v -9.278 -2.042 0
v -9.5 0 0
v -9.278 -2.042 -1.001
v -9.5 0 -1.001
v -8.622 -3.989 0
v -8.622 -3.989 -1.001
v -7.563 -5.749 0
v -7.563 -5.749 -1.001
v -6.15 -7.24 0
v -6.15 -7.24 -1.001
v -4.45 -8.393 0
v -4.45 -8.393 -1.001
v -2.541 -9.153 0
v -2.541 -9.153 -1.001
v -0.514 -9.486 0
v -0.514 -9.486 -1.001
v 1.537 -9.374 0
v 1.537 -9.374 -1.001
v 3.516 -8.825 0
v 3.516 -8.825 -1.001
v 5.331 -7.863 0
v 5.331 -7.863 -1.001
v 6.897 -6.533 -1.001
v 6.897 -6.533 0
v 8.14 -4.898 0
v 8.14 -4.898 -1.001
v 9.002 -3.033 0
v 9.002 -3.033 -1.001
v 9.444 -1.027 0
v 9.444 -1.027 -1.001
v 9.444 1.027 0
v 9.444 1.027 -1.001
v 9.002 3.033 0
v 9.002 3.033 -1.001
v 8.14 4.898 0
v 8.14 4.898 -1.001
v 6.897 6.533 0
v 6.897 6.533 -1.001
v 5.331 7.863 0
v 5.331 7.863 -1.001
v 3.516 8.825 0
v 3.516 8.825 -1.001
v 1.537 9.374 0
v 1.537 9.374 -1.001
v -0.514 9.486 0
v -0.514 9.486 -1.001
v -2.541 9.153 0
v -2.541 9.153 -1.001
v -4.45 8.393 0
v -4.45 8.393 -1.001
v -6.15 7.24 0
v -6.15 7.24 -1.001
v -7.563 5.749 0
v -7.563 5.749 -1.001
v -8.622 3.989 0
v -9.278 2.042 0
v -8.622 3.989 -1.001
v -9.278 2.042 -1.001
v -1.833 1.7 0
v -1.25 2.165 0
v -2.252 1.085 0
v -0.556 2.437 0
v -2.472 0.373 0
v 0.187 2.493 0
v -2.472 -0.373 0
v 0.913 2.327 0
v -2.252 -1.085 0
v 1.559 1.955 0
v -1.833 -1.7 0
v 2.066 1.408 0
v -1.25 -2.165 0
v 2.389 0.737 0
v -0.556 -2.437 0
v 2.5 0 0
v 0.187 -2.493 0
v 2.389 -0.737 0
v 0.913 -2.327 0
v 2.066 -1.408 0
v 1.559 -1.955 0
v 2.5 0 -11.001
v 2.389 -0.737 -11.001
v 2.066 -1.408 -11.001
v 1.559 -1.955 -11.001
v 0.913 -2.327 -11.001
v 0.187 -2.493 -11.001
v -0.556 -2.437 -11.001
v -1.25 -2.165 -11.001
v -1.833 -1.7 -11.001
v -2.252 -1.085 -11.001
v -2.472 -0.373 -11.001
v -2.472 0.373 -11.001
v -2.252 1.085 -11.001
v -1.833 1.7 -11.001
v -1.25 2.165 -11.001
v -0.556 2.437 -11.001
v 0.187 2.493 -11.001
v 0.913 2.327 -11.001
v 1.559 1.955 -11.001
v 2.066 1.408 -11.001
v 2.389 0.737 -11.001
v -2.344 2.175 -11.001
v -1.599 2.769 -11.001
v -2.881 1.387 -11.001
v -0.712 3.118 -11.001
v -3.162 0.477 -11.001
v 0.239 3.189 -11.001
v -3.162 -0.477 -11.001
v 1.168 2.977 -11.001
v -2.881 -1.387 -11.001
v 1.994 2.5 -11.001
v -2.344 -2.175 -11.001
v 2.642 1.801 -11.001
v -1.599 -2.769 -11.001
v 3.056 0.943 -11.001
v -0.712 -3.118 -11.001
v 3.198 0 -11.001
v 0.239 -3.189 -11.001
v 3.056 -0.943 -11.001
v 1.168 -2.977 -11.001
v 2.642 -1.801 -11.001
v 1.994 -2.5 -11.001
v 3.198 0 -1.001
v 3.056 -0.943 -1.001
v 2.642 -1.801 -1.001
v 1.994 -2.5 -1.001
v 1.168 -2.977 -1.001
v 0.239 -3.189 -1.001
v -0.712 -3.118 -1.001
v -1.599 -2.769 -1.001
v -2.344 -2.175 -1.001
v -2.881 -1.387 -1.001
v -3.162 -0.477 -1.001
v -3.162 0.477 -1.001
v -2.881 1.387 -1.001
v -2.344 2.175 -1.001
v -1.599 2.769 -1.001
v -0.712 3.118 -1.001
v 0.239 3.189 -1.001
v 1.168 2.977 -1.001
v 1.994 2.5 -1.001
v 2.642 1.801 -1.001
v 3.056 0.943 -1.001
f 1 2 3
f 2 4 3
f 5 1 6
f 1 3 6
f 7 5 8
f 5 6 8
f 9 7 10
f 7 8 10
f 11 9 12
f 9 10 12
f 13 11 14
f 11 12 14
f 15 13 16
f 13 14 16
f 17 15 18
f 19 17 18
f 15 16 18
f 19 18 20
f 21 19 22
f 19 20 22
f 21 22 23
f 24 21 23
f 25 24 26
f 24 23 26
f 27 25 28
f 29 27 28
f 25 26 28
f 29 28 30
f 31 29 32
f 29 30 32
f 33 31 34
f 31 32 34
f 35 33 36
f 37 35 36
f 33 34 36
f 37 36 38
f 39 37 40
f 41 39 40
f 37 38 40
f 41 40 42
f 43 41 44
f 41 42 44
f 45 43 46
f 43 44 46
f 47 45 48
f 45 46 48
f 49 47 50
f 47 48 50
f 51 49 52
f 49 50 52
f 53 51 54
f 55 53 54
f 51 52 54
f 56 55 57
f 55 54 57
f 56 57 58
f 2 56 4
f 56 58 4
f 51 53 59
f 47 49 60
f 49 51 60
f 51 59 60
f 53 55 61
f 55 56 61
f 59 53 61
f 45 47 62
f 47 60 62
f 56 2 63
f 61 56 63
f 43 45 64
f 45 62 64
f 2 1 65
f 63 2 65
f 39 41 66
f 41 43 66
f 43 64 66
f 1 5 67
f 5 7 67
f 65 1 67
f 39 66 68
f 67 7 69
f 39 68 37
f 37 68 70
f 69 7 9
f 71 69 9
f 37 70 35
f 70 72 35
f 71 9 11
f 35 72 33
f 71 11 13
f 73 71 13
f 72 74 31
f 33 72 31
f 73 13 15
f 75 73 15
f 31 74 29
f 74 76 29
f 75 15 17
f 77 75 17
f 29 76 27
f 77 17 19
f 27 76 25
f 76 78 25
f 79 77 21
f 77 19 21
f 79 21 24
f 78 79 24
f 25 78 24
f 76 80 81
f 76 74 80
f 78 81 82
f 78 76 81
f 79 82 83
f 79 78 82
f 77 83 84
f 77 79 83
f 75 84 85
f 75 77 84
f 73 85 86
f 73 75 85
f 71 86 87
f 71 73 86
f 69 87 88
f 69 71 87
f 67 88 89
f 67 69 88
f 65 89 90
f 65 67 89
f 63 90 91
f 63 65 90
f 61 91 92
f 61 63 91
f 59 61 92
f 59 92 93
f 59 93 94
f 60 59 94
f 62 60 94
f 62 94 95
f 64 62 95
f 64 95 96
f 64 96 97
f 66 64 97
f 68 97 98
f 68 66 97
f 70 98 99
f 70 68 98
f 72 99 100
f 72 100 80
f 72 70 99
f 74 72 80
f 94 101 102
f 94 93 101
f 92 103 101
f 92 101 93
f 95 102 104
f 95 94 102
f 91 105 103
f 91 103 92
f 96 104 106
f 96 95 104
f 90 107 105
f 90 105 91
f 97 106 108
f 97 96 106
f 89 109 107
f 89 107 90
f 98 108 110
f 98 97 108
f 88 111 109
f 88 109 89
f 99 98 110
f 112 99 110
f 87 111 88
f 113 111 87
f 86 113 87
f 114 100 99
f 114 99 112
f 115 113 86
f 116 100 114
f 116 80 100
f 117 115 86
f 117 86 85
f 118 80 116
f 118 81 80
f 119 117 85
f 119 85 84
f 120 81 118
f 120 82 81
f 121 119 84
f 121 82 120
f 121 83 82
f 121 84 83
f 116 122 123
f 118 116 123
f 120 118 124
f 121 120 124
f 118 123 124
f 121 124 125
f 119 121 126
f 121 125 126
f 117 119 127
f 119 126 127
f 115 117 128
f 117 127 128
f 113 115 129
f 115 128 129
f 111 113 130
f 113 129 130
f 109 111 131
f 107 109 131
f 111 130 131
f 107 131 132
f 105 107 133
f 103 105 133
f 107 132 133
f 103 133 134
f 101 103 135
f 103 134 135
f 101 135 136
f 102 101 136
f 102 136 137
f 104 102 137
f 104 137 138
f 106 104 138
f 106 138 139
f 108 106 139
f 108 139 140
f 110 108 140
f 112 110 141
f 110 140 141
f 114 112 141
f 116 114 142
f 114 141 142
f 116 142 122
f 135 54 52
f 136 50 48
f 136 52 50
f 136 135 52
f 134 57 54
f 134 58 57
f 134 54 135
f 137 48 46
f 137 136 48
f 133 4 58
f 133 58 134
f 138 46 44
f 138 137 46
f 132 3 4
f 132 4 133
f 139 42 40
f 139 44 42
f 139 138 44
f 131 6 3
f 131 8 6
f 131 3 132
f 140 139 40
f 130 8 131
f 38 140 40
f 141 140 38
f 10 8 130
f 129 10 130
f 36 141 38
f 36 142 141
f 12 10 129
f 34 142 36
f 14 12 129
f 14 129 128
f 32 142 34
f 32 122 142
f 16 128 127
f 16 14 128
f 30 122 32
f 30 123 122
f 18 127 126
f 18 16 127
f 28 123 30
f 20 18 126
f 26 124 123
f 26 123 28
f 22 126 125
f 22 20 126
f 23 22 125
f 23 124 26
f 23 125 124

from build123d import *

# Parameters (mm, degrees)
SKETCH2_W           = 1.00076
SKETCH2_H           = 9.4996
SKETCH3_R           = 2.50000008
CUT_EXTRUDE1_DEPTH  = 2.54
SKETCH4_R           = 3.19786
SKETCH4_R_2         = 2.50000008
BOSS_EXTRUDE1_DEPTH = 9.99998


with BuildPart() as part:
    # Sketch2 → Revolve1 (revolve)
    with BuildSketch(Plane(origin=(0, 0, 0), x_dir=(0, 0, -1), z_dir=(1, 0, 0)), mode=Mode.PRIVATE) as revolve1_sk:
        with Locations((0.50038, 4.7498)):
            Rectangle(SKETCH2_W, SKETCH2_H)
    revolve(revolve1_sk.sketch.rotate(Axis((0, 0, -1.00076), (0, 0, 1)), 90), axis=Axis((0, 0, -1.00076), (0, 0, 1)))

    # Sketch3 → Cut-Extrude1 (cut)
    with BuildSketch(Plane.XY):
        Circle(SKETCH3_R)
    extrude(amount=-CUT_EXTRUDE1_DEPTH, mode=Mode.SUBTRACT)

    # Sketch4 → Boss-Extrude1 (add)
    with BuildSketch(Plane(origin=(0, 0, -1.00076), x_dir=(-1, 0, 0), z_dir=(0, 0, -1))):
        with Locations(Location((0, 0, 0), (0, 0, 180))):
            Circle(SKETCH4_R)
        with Locations(Location((0, 0, 0), (0, 0, 180))):
            Circle(SKETCH4_R_2, mode=Mode.SUBTRACT)
    extrude(amount=BOSS_EXTRUDE1_DEPTH)


solid = part.part
